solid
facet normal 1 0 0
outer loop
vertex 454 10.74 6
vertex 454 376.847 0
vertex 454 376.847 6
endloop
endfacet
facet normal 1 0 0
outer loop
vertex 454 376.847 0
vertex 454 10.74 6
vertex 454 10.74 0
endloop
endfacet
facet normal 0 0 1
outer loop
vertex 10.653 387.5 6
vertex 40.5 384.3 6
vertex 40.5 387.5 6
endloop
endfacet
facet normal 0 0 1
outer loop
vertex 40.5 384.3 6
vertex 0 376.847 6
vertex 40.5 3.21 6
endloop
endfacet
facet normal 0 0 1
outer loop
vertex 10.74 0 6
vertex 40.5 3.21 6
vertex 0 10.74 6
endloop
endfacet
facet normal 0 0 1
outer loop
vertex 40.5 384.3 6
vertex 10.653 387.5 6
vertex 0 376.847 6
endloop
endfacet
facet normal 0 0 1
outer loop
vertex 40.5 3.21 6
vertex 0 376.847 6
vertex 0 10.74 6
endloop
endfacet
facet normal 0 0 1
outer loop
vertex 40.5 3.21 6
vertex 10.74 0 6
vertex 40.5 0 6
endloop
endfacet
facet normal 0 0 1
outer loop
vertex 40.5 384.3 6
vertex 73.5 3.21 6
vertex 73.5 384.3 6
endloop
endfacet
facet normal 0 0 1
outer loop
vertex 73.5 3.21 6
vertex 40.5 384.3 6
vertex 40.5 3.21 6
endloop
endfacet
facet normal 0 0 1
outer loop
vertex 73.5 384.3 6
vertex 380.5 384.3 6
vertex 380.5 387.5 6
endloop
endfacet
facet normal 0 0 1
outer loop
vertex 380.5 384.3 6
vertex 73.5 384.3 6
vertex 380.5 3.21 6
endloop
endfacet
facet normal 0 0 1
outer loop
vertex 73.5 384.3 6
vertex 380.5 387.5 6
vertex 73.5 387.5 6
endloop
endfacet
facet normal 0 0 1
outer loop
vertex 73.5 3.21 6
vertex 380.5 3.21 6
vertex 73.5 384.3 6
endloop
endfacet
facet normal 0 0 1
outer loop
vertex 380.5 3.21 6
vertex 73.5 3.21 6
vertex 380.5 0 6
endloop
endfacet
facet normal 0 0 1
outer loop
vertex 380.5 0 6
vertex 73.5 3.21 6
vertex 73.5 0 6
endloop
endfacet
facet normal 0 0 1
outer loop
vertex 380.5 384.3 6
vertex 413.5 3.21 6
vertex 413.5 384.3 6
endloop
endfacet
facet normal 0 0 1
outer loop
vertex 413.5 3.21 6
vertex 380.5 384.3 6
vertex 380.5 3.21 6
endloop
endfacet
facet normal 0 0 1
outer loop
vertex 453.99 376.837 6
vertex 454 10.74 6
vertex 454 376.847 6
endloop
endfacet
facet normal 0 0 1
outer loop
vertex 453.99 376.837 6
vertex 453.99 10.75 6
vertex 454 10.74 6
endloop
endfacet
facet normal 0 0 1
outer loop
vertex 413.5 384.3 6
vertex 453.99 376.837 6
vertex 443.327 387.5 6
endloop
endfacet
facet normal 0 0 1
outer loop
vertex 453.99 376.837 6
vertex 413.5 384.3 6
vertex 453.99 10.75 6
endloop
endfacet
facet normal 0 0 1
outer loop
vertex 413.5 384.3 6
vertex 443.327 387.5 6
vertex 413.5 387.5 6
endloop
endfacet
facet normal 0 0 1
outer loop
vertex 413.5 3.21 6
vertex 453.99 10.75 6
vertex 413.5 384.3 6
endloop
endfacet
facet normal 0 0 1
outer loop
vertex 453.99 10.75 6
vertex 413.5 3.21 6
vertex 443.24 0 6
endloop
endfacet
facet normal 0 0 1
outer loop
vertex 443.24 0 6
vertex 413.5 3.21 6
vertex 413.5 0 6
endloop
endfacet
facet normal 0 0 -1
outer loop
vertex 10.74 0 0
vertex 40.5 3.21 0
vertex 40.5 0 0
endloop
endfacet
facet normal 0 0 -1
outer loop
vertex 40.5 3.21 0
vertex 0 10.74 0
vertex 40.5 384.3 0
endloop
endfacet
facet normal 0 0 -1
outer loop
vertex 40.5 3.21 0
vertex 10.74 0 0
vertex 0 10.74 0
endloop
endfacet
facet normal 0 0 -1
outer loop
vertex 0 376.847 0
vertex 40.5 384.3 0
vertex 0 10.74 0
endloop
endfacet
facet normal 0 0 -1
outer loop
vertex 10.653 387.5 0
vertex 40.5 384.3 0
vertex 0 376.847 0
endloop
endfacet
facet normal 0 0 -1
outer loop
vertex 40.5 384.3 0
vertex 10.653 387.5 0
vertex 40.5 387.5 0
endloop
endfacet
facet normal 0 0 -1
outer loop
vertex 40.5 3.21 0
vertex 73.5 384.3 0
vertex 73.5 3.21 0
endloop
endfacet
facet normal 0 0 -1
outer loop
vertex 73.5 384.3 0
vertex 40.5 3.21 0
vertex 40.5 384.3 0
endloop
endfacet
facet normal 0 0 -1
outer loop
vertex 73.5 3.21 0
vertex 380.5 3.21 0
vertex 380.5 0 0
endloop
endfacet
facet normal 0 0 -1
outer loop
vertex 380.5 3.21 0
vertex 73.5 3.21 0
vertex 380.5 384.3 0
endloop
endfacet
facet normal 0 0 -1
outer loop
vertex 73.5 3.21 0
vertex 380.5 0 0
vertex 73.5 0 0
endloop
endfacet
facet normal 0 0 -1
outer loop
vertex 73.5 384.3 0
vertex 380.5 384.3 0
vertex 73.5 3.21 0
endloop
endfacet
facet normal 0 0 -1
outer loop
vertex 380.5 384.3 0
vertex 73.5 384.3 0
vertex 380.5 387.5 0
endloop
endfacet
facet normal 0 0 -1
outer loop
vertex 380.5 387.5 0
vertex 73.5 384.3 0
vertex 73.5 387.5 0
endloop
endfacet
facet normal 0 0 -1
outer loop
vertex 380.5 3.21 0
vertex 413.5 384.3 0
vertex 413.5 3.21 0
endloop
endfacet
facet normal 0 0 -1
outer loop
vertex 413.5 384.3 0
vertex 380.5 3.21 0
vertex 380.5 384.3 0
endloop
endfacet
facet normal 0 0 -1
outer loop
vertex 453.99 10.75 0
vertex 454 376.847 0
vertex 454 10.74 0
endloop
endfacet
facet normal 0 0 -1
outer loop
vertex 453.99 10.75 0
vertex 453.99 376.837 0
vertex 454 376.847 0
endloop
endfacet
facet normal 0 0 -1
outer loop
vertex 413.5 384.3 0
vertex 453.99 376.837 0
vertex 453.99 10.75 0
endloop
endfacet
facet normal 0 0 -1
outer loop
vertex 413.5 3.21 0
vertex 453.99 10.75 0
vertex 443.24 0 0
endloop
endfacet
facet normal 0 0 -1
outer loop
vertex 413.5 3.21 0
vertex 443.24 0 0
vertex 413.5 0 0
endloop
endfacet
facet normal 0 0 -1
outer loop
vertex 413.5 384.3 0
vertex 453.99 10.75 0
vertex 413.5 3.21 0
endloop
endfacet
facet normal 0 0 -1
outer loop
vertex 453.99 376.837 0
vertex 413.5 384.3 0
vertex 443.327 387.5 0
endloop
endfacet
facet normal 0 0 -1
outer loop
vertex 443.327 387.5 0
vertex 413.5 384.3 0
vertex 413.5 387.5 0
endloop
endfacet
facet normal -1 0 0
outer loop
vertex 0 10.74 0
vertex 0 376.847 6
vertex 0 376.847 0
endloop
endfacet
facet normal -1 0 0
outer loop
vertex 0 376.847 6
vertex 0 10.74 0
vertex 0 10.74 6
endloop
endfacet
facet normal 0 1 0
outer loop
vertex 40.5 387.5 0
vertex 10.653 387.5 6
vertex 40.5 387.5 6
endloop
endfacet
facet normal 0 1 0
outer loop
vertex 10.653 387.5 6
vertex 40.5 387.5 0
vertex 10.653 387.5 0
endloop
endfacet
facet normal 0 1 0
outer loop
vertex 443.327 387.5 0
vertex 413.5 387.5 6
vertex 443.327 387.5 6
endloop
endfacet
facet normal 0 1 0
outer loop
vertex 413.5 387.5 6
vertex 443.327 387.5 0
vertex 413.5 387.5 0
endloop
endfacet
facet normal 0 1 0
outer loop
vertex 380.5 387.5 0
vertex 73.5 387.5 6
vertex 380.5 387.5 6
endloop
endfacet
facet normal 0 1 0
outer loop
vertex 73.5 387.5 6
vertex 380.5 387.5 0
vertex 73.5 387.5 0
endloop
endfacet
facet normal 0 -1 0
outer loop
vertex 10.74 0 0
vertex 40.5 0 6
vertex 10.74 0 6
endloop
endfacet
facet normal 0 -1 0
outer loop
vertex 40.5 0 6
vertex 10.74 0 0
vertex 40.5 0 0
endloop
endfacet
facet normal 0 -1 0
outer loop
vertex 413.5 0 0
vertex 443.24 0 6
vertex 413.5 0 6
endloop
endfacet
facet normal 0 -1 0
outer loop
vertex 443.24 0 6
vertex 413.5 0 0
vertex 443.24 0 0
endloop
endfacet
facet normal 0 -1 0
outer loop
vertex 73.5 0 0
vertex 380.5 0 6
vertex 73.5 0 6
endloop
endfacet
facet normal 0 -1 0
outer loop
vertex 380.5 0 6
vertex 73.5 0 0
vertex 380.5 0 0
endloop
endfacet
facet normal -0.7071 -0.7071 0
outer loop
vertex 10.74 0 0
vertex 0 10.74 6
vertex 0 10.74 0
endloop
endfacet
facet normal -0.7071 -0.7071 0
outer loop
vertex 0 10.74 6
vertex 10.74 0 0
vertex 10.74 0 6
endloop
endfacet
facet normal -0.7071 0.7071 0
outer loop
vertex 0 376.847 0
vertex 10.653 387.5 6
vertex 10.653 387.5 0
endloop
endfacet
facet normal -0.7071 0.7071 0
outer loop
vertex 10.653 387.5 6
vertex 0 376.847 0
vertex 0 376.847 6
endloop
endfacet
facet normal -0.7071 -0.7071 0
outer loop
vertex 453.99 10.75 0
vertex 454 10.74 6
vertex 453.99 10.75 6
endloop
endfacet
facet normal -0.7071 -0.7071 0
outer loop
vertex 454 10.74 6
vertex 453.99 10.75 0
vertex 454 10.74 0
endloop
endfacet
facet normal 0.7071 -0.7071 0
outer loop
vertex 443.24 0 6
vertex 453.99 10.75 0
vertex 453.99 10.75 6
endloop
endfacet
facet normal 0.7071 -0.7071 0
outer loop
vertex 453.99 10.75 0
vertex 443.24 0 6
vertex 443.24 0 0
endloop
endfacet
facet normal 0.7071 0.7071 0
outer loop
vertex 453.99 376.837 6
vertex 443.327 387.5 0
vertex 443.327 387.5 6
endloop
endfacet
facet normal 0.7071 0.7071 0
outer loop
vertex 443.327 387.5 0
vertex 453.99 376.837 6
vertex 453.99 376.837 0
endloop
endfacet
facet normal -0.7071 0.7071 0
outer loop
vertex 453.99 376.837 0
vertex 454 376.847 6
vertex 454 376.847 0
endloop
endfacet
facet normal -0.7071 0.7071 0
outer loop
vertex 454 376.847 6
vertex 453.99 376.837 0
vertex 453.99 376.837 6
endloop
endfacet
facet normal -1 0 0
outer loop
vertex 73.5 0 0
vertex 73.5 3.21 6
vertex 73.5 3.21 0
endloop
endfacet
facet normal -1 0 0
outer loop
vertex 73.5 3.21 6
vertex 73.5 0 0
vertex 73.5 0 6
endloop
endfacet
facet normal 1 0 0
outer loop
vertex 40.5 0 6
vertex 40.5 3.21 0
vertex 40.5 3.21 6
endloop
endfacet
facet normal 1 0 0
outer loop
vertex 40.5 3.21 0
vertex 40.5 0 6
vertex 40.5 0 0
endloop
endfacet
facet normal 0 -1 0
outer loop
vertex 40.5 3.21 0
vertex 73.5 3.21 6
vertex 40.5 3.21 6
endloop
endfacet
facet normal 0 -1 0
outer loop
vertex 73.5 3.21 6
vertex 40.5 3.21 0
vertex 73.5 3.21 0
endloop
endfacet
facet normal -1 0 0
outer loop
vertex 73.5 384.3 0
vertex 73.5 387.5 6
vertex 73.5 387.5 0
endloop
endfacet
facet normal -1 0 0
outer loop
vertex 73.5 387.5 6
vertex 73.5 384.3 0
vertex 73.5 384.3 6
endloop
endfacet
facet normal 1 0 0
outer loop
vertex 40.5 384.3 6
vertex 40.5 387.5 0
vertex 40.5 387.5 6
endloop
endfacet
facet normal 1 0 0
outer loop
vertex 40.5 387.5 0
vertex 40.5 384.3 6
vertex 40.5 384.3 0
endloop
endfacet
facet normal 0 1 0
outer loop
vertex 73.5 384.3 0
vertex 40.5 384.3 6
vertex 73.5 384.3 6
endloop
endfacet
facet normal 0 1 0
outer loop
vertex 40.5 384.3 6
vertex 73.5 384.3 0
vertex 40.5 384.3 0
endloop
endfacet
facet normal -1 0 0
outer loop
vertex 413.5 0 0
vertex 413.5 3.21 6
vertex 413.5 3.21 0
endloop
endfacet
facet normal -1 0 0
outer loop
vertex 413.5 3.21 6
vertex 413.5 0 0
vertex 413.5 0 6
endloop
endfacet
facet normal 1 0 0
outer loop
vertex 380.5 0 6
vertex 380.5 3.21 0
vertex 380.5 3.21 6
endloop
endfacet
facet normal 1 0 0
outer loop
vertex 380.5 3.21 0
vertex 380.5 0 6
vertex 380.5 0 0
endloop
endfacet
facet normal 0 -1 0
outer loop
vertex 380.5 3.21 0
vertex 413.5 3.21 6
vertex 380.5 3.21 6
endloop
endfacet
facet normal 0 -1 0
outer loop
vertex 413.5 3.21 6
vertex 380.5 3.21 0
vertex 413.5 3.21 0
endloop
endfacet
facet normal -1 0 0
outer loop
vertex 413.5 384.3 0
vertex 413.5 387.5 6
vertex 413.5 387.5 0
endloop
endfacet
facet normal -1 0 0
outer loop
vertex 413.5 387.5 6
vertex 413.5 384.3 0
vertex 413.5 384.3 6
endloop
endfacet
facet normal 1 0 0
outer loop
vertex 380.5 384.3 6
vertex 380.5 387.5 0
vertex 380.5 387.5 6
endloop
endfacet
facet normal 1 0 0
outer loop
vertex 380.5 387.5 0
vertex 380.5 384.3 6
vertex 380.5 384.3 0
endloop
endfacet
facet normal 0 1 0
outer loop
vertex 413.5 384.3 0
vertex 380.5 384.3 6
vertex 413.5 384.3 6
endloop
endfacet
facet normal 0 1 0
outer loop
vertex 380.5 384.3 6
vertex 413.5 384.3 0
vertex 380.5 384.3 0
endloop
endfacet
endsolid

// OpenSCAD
// file: nut.scad
// Nut model.

$fn = 50;
OX = 0.01;

// 2D nut polygon.
module regular_polygon(order, r = 1) {
    angles = [for(i = [0 : order - 1]) i * (360 / order)];
    coords = [for(th = angles) [r * cos(th), r * sin(th)]];
    polygon(coords);
}

// Simple nut model.
// d - rod diameter.
// m - nut height.
// e - max outer nut diameter.
// order - nut corner count.
// material - nut color.
module nut(d = 10, m = 5, e = 20, order = 6, material = [0.8, 0.8, 0.8]) {
    color(material) difference() {
        linear_extrude(height = m) regular_polygon(order, e / 2);
        translate([0, 0, -OX]) cylinder(r = d / 2, h = m + 2 * OX);
    }
}

// Example:
nut(10, 5, 20);
// file: gpu.scad
// GPU model.

$fn = 50;
OX = 0.01;

// GPU model.
// @param pcb Color of the PCB.
module gpu(pcb = [236/255, 53/255, 57/255]) {
	color(pcb) union() {
		translate([0, 10, 0]) cube([300, 110, 1.5]);
		translate([300 - 85 - 45, 0, 0]) cube([85, 10, 1.5]);
	}
}

// Example:
gpu();
// file: psu_mod.scad
// PSU modification model.

$fn = 50;
OX = 0.01;

// PSU modification model.
// @param primary Color of the primary PCB.
// @param secondary Color of the secondary PCB.
module psu_mod(primary = [42/255, 153/255, 85/255],
	secondary = [106/255, 96/255, 84/255]) {
	difference() {
		union() {
			color(secondary) translate([0, 0, -1.5]) cube([80, 140, 1.5]);
			color(primary) translate([70, 0, 0]) cube([160, 150, 1.5]);
		}
		translate([215 + OX, -OX, -OX]) cube([15, 40, 10]);
	}
}

// Example:
psu_mod();
// file: motherboard.scad
// ATX motherboard.

// Constants:
OX = 0.01;
pcbX = 305;
pcbY = 204;
pcbZ = 1.5;
wtxX = 356;
wtxY = 356;
ramX = 140;
ramY = 7;
ramZ = 7;

// Colors:
pcbColor = [56/255, 107/255, 172/255];
wtxColor = [100/255, 100/255, 255/255, 0.3];
metalColor = [255/255, 255/255, 255/255];
ram1Color = [238/255, 51/255, 41/255];
ram2Color = [252/255, 224/255, 57/255];
darkColor = [64/255, 64/255, 64/255];

// Modules:
module ramSlot(baseColor) {
    color(baseColor) {
        cube([140, ramY, ramZ]);
        cube([6, ramY, 17]);
        translate([ramX - 6, 0, 0]) cube([6, ramY, 17]);
    }
    color(metalColor) {
        translate([ramX - 6, 0, 17]) cube([9, ramY, 7]);
    }
    color(metalColor) {
        translate([-3, 0, 17]) cube([9, ramY, 7]);
    }
}

module pcie1() {
    color(darkColor) cube([ramY, 25, 11]);
}

module pcie16() {
    color(darkColor) cube([ramY, 90, 11]);
}

module motherboard() {
    // PCB:
	translate([wtxX - pcbX, 0, 0]) {
		color(pcbColor) cube([pcbX, pcbY, pcbZ]);
		translate([0, 0, pcbZ]) { // Place on board.

		// Periphery:
		color(metalColor) {
			translate([3, -1, 0]) {
				cube([14, 20, 28]);
				translate([14+5, 0, 0]) cube([14, 12, 30]);
				translate([(19)+14+5, 0, 0]) cube([15, 22, 27]);
				translate([(38)+15+5, 0, 0]) cube([15, 22, 27]);
				translate([(58)+15+5, 0, 0]) cube([18, 27, 31]);
				translate([(78)+18+5, 0, 0]) cube([18, 27, 31]);
				translate([(101)+18+5, 0, 0]) cube([24, 21, 35]);
			}
		}

		// RAM:
		translate([16, pcbY - 27, 0]) ramSlot(ram1Color);
		translate([16, pcbY - 27 - 2 * (ramY + 1), 0]) ramSlot(ram1Color);
		translate([16, pcbY - 27 - 1 * (ramY + 1), 0]) ramSlot(ram2Color);
		translate([16, pcbY - 27 - 3 * (ramY + 1), 0]) ramSlot(ram2Color);

		translate([159, 43, 0]) pcie16();
		translate([159 + 20 * 1, 43, 0]) pcie1();
		translate([159 + 20 * 2, 43, 0]) pcie16();
		translate([159 + 20 * 3, 43, 0]) pcie1();
		translate([159 + 20 * 4, 43, 0]) pcie16();
		translate([159 + 20 * 5, 43, 0]) pcie1();
		translate([159 + 20 * 6, 43, 0]) pcie16();

		}
	}
	// WTX preview:
	color(wtxColor) translate([0, 0, OX]) cube([wtxX, wtxY, pcbZ - 2 * OX]);
}

motherboard();
// file: insert_mount.scad
// Insert mount.

use <nut.scad>;

$fn = 50;
OX = 0.01;

plexiglass = 6.4; // Base plexiglass for mount.
diode = 3; // Width of plexiglass for light. Default value is 2.
biasX = 9.5; // Pillars bias.
alpha = 30;
beta = 90 - alpha;
height = 140 / 2; // Half of the radiator height.
x = 27 + 1.6;
y = 18 + 0.5; // Insert mount width.
z0 = height / cos(alpha);
z1 = sin(alpha) * x / cos(alpha);
z = z0 + z1;
base = x / cos(alpha);
baseOffset = z0 * cos(beta) - biasX;
plexiglassOffset = plexiglass / 2 * tan(alpha);

d = 10 + 0.2;
m = 5 + 0.9;
e = 19 + 1.0; // Nut outer radius.
s = e * cos(alpha); // Nut inner radius.
biasY = 11.7;
base = x / cos(alpha);
baseCenter = 13.3785; // Dynamic center = (base - biasX) / 2 + 2.54;
//echo(baseCenter);
ledWidth = 12.95;
ledHeight = 4.5;
ledBias = -7;
ledLength = 59;
hatDepth = 2.0;
lugdiff = 40; // Lug maximum diameter for difference.

// Pillar mount hole.
module pillar_hole(r1 = 1.5, r2 = 3.3, height = 18.5, depth = 2.0) {
	rotate([-90, 0, 0]) {
		cylinder(r = r1, h = height + 2 * OX);
		cylinder(r = r2, h = depth + 2 * OX);
		translate([0, 0, height - depth + OX])
			cylinder(r = r2, h = depth + 2 * OX);
	}
}

// Pillar.
module pillar(lug) {
	difference() {
		union() {
			translate([-biasX, 0, 0]) difference() {
				rotate([0, alpha, 0]) cube([x, y, z]);
				translate([0, -OX, 0]) cube([biasX, y + 2 * OX, 1.5 * x + 2 * OX]);
				translate([0, -OX, -1.5 * x]) cube([1.5 * x + 2 * OX, y + 2 * OX, 1.5 * x + 2 * OX]);
			}
			// Lugs for solid:
			translate([0, 0, 0]) rotate([-90, 0, 0]) cylinder(r = 18, h = lug);
			translate([30, 0, 0]) rotate([-90, 0, 0]) cylinder(r = 18, h = lug);
			// Lugs for pillars:
			translate([0, y - lug, 0]) rotate([-90, 0, 0]) cylinder(r = 18, h = lug);
			translate([30, y - lug, 0]) rotate([-90, 0, 0]) cylinder(r = 18, h = lug);
			// Lugs for plexi:
			translate([0, y / 2 - diode / 2, 0]) rotate([-90, 0, 0]) cylinder(r = 18, h = lug);
			translate([30, y / 2 - diode / 2, 0]) rotate([-90, 0, 0]) cylinder(r = 18, h = lug);
		}
		// Mounts:
		translate([baseCenter, y / 2, 0]) cylinder(r = d / 2, h = 15);
		translate([baseCenter, -OX + y / 2, biasY])
			scale([1, 0.96, 1]) // Increase side layers.
				nut(0, m, e);
		//translate([baseCenter - s / 2, -OX, biasY]) cube([s, e, m]); // TODO: Big nut hole.
		// Holes:
		translate([7.25, -OX, 7.25]) pillar_hole();
		translate([19.5, -OX, 7.25]) pillar_hole();
		translate([24.0, -OX, 7.25 + 40]) pillar_hole();
		translate([44.5, -OX, 7.25 + 40]) pillar_hole();
	}
}

// Place for leds.
module led_place() {
	translate([baseOffset - plexiglassOffset + base / 2 - 5.6 - ledBias * sin(alpha), y / 2 - diode / 2 - ledHeight + OX, ledBias * cos(alpha)])
			rotate([0, -alpha, 0])
				cube([ledWidth, ledHeight, ledLength]);
}

// Insert mount base.
module mount_base(lug) {
	difference() {
		union() {
			translate([0, 0, -height]) pillar(lug);
			translate([0, 0, height]) mirror([0, 0, 1]) pillar(lug);
			// Improvements:
			translate([baseOffset - plexiglassOffset, 0, -plexiglass / 2]) cube([plexiglass, y, plexiglass]);
			// Solid central lug:
			translate([30, 0, 0]) rotate([-90, 0, 0]) cylinder(r = 15, h = lug);
			// Plexi central lug:
			translate([30, y / 2 - diode / 2, 0]) rotate([-90, 0, 0]) cylinder(r = 15, h = lug);
		}
		// Improvements:
		pg = plexiglass + 0.2;
		translate([baseOffset + base - plexiglassOffset, -OX, -x]) cube([1.5 * x + 2 * OX, y + 2 * OX, 1.5 * x + 2 * OX]);
		translate([0, y / 2 + diode / 2, -pg / 2 - OX]) cube([base + baseOffset + plexiglassOffset, y, pg + 2 * OX]);
		// Place for leds:
		led_place();
		mirror([0, 0, 1]) led_place();
		translate([baseOffset + 6.9, y / 2 - diode / 2 - ledHeight + OX, -ledWidth / 2]) cube([ledWidth, ledHeight, ledWidth]);
		translate([baseOffset + 19, y / 2 - diode / 2 - ledHeight + OX, -plexiglass / 2]) cube([15, ledHeight, plexiglass]);
		// Additional gain:
		translate([34.5, -OX, 0]) pillar_hole();
	}
	// Solid central lug:
	translate([56, 0, 0]) rotate([-90, 0, 0]) cylinder(r = 18, h = lug);
	// Pillar lugs:
	translate([56, y - lug, 0]) rotate([-90, 0, 0]) cylinder(r = 18, h = lug);
	translate([30, y - lug, 0]) rotate([-90, 0, 0]) cylinder(r = 15, h = lug);
	// Plexi central lug:
	translate([56, y / 2 - diode / 2, 0]) rotate([-90, 0, 0]) cylinder(r = 18, h = lug);
}

// Solid mount part.
module mount_solid(lug = 0) {
	difference() {
		mount_base(lug);
		translate([-lugdiff / 2, y / 2 - diode / 2 - OX, - height - lugdiff / 2]) cube([baseOffset + base + lugdiff, y, 2 * height + lugdiff]);
	}
}

// Plexiglass mount part.
module mount_plexi(lug = 0) {
	difference() {
		mount_base(lug);
		translate([-lugdiff / 2, -OX, - height - lugdiff / 2]) cube([baseOffset + base + lugdiff, y / 2 - diode / 2, 2 * height + lugdiff]);
		translate([-lugdiff / 2, y / 2 + diode / 2, - height - lugdiff / 2]) cube([baseOffset + base + lugdiff, y, 2 * height + lugdiff]);
	}
}

// Mount pillars.
module mount_pillars(lug = 0) {
	difference() {
		mount_base(lug);
		translate([-lugdiff / 2, -OX, - height - lugdiff / 2]) cube([baseOffset + base + lugdiff, y / 2 + diode / 2 + 2 * OX, 2 * height + lugdiff]);
		// TODO: Hardcoded size and place.
		//translate([52.5, 14.65, -27]) rotate([90, 0, 0]) pillar_hole(1.5, 3.3, 54, 15.0);
	}
}

// Insert mount.
module insert_mount(mountColor = [1.0, 0.0, 0.0], plexiColor = [1.0, 1.0, 1.0, 0.8]) {
	color(mountColor) mount_solid();
	translate([2 * OX, -OX, OX]) color(plexiColor) mount_plexi();
	translate([-OX, 2 * OX, -OX]) color(mountColor) mount_pillars();
}

// Example:
//rotate([90, 0, 0]) insert_mount();
//insert_mount();
//mount_solid();

// For print:
//rotate([90, 0, 0]) mount_solid(lug = 0.3);
//translate([0, 0, -(y / 2 - diode / 2)]) rotate([90, 0, 0]) mount_plexi(lug = 0.3);
//translate([0, 0, y]) rotate([90, 0, 0]) mirror([0, 1, 0]) mount_pillars(lug = 0.3);
//pillar_hole();

// For laser:
translate([0, 0, -(y / 2 - diode / 2)]) rotate([90, 0, 0]) mount_plexi(lug = 0.0);
// main file
// Case insert model.

use <insert_mount.scad>;
use <motherboard.scad>;
use <psu_mod.scad>;
use <gpu.scad>;

$fn = 50;
OX = 0.01;

diode = 3; // Width of plexiglass for light. Default value is 2.
y = 18 + 0.5; // Insert mount width.
paddingX = 2; // Padding of width.
biasX = 13.4 - paddingX; // Bias to center.
biasY = y / 2 - diode / 2;

module mounts(width, height, mountColor, plexiColor) {
	translate([biasX, 0, 0]) insert_mount(mountColor, plexiColor);
	translate([biasX, height + 2 * y, 0]) mirror([0, 1, 0]) insert_mount(mountColor, plexiColor);
	translate([width - biasX, 0, 0]) mirror([1, 0, 0]) insert_mount(mountColor, plexiColor);
	translate([width - biasX, height + 2 * y, 0]) mirror([1, 0, 0]) mirror([0, 1, 0]) insert_mount(mountColor, plexiColor);
}

module base(width, height, thickness = 6, plexiColor = [192/255, 192/255, 192/255]) {
	deep = 0.2;
	mountX = 29.1;
	notchX = 33;
	color(plexiColor) difference() {
		cube([width, height + y + diode, thickness]);
		// Bevels:
		translate([-OX, biasY + diode, -OX]) rotate([0, 0, -135]) cube([y, y, thickness + 2 * OX]);
		translate([-OX, height + 2 * y, -OX]) rotate([0, 0, -135]) cube([y, y, thickness + 2 * OX]);
		translate([-OX + width, biasY + diode, -OX]) rotate([0, 0, -135]) cube([y, y, thickness + 2 * OX]);
		translate([-OX + width, height + 2 * y, -OX]) rotate([0, 0, -135]) cube([y, y, thickness + 2 * OX]);
		// Notches:
		translate([biasX + mountX, -OX, -OX]) cube([notchX, diode + deep + 2 * OX, thickness + 2 * OX]);
		translate([biasX + mountX, height + y - deep, -OX]) cube([notchX, diode + deep + 2 * OX, thickness + 2 * OX]);
		translate([width - biasX - notchX - mountX, -OX, -OX]) cube([notchX, diode + deep + 2 * OX, thickness + 2 * OX]);
		translate([width - biasX - notchX - mountX, height + y - deep, -OX]) cube([notchX, diode + deep + 2 * OX, thickness + 2 * OX]);
	}
}

// Insert model.
// @param width Whidth of the plexiglass base.
// @param height Height of the motherboard.
module insert(width = 458, height = 356, thickness = 6, mountColor = [1.0, 0.0, 0.0], plexiColor = [1.0, 1.0, 1.0, 0.5], lightColor = [1.0, 1.0, 1.0, 0.8]) {
	// PSU:
	translate([0, biasY + diode + 230, -1.5 - 5]) rotate([0, 0, -90]) psu_mod();
	// GPU:
	translate([158, biasY + diode + 236, -1.5 - 5 - OX]) {
		gpu(); // GPU 1.
		translate([0, -150, 0]) gpu(); // GPU 2.
	}
	// Motherboard:
	translate([width, biasY + diode, thickness + 5]) rotate([0, 0, 90]) motherboard();
	// Mounts:
	translate([0, -biasY, thickness / 2 + OX]) mounts(width, height, mountColor, lightColor);
	// Plexiglass:
	base(width, height, thickness, plexiColor);
}

// Example:
//insert(454, 356 + 10);

// Model for print:
base(454, 356 + 10);
